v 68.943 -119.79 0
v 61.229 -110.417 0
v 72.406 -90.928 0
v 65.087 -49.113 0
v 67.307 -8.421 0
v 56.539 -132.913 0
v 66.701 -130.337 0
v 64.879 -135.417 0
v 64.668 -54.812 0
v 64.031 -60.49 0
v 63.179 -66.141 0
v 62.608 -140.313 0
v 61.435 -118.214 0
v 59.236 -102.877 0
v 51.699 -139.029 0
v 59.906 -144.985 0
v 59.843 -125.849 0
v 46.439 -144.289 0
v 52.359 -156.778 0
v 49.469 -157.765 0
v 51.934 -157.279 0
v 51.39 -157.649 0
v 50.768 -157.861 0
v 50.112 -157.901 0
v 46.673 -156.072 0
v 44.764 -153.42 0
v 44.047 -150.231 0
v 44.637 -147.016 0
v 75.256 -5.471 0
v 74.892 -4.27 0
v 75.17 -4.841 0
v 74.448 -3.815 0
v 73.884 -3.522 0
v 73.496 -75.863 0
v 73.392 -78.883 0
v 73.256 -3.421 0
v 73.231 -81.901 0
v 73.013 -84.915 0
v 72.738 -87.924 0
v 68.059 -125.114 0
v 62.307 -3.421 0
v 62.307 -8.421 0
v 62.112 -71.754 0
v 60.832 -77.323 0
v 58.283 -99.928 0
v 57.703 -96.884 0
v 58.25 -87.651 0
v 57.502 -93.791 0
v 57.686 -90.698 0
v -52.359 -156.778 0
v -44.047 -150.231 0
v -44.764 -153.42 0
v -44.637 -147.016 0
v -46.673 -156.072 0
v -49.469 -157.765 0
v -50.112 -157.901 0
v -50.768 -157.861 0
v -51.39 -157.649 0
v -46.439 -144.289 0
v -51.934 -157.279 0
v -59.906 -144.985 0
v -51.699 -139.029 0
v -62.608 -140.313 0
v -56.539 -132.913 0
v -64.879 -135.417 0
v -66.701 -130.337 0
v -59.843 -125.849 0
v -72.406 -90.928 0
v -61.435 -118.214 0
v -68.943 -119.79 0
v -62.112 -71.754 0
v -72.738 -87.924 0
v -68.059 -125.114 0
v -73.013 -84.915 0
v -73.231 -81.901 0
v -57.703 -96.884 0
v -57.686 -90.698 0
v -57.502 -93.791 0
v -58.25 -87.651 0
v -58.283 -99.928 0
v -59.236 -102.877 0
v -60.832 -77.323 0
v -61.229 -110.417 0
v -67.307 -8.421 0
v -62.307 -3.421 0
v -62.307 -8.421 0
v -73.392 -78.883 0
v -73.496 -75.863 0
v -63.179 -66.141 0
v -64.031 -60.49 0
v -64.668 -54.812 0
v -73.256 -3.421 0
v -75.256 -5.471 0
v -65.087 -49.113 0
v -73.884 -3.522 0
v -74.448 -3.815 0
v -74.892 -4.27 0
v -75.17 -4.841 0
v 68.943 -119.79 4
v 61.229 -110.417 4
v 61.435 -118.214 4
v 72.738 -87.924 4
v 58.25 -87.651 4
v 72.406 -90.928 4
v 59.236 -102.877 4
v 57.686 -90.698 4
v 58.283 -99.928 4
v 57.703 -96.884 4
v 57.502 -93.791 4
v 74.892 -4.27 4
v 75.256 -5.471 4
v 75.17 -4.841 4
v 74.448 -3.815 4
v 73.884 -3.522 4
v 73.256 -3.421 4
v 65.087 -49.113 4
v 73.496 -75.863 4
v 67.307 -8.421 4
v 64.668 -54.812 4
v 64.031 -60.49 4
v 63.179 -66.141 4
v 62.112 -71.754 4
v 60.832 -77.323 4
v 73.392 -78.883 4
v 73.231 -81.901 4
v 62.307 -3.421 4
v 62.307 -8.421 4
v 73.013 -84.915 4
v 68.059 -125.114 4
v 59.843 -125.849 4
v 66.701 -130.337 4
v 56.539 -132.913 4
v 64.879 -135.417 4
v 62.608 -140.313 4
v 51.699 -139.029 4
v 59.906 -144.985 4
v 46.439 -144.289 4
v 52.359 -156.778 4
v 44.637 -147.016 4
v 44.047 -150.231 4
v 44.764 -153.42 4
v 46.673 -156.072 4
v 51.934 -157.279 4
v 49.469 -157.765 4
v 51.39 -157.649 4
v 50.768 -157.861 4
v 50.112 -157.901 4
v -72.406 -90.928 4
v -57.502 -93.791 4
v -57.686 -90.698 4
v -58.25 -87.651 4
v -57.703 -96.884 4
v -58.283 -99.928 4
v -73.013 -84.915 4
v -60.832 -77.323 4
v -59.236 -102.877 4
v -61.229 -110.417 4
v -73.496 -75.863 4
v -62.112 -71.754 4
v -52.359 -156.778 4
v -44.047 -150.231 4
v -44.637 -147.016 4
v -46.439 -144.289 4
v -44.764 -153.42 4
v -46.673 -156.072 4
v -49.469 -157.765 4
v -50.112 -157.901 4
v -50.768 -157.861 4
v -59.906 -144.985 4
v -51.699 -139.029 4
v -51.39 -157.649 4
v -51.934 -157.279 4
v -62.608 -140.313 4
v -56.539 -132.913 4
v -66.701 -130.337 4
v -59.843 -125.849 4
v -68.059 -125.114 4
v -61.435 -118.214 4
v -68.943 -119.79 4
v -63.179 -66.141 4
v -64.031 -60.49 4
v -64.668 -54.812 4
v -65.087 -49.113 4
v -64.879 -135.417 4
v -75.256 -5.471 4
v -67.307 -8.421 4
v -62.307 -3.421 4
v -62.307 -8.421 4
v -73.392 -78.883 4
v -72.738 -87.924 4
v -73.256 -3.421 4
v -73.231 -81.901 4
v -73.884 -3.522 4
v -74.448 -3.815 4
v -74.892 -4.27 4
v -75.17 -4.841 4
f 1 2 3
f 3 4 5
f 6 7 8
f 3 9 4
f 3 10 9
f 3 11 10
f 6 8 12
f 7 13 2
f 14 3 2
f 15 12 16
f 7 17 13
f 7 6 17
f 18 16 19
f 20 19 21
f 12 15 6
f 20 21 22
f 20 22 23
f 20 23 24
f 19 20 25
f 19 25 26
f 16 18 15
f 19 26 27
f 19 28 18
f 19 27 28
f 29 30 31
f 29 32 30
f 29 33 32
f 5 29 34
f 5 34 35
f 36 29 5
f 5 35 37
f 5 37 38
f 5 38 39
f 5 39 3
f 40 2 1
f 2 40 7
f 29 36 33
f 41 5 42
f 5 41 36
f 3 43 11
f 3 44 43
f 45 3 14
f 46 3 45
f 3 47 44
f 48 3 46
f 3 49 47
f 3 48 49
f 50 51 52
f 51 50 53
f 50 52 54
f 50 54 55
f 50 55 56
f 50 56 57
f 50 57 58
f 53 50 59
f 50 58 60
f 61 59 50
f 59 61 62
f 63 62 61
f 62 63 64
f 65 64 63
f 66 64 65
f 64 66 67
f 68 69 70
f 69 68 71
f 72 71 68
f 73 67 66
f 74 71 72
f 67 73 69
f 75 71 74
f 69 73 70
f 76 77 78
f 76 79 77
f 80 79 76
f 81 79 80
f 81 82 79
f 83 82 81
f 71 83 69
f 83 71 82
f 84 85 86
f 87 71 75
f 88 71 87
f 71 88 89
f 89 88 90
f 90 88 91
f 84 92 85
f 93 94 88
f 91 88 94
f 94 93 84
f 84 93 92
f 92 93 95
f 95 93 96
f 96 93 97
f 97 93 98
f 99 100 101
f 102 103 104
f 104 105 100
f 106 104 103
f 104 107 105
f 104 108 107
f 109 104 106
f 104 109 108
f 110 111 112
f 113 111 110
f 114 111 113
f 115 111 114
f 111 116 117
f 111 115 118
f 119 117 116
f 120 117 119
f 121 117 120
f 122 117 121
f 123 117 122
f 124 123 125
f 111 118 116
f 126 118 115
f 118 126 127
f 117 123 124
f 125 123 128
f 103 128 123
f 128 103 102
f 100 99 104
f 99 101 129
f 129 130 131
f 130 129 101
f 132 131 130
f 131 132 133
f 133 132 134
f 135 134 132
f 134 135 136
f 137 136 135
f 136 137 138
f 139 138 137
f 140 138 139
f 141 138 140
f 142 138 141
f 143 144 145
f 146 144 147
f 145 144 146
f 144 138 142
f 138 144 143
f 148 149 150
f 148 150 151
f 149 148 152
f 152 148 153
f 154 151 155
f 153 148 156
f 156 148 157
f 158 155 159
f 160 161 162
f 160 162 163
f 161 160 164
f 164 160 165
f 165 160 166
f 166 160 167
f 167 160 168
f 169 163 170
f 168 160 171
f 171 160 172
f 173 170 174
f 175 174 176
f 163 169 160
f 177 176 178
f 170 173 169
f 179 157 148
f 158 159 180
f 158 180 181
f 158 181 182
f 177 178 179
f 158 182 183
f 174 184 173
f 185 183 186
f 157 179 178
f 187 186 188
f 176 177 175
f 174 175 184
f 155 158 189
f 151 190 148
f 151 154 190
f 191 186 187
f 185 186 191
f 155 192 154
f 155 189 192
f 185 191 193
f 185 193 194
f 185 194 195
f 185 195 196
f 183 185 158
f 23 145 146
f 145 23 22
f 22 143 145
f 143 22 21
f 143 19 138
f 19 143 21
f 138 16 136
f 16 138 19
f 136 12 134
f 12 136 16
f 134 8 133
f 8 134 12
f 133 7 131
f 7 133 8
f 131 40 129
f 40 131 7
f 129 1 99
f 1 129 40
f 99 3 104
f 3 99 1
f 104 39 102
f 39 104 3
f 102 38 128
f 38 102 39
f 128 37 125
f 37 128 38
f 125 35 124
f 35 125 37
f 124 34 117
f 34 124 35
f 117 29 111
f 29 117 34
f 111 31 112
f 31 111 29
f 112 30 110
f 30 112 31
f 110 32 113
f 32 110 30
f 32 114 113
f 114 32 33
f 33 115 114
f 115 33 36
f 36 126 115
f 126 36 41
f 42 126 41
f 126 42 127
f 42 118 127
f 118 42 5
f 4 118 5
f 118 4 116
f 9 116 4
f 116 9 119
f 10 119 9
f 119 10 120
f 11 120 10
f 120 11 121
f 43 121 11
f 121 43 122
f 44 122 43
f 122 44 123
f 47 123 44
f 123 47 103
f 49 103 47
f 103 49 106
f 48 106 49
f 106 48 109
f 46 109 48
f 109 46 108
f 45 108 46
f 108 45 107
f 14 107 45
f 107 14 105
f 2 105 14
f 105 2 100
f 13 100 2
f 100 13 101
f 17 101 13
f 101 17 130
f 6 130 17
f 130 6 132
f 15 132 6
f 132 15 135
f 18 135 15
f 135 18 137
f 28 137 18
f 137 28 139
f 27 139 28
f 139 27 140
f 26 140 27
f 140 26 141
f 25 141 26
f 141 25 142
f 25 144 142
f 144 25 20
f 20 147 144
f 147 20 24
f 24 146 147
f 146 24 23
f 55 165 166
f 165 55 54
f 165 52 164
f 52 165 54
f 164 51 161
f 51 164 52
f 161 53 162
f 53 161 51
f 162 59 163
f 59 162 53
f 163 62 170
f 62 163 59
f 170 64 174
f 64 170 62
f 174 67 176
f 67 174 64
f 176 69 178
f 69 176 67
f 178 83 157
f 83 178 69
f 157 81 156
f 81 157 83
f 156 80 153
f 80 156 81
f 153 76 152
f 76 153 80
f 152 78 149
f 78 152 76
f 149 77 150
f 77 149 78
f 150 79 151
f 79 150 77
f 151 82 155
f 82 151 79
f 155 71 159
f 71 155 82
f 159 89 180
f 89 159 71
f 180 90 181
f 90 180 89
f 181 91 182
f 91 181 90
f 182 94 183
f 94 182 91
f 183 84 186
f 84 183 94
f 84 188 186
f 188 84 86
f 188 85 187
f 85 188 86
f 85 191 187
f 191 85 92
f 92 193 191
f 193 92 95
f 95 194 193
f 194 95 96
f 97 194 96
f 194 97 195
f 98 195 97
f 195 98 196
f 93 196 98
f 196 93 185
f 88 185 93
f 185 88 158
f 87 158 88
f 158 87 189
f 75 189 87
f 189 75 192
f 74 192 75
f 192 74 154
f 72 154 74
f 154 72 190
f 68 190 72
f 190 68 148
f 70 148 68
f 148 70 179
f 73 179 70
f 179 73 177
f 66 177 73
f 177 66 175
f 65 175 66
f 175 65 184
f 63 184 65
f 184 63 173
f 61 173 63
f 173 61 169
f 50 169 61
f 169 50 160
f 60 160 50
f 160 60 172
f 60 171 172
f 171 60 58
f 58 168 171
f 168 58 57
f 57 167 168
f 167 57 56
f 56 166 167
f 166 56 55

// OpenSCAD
w=148;
hw=w/2;
bridge=20;
edge=rnd(1,5);
rounding=rnd(10,14);
bridgeedge=rnd(edge,10);

halfbridge=bridge/2;
v0=rnd(-0.5,1);
v1=rnd(-0.5,1);
v2=rnd(-0.5,1);
v3=rnd(-0.5,1);
vm=[v0,v1,v2,v3];
v=vm/norm(vm);
n0=  [[-halfbridge, 0, 0], [-halfbridge, 2.5, 0], [3, 2, 25], [18, 10, 150], [48, 11, 150], [58, 4, 5], [67, 4, 1], [67, -4, 1], [62, -3, 5], [58, -18, 25], [51, -40, 25], [33, -40, 25], [8, -40, 25], [-4, -7, 1], [0, -3, 1.6], [-halfbridge, -3, 0]];
n1=  [[-halfbridge, 0, 0], [-halfbridge, 11, 0], [0, 11, 5], [8, 12, 10], [53, 11, 10], [58, 4, 5], [67, 4, 1], [67, -4, 0], [61, -4, 1], [60, -10, 5], [56, -40, 10], [33, -40, 0], [8, -40, 10], [-4, -7, 1], [0, -3, 1.6], [-halfbridge, -3, 0]];
n2=  [[-halfbridge, 0, 0], [-halfbridge, 2.5, 0], [0, 2, 5], [10, 20, 50], [48, 20, 50], [58, 4, 5], [67, 4, 1], [67, -4, 1], [61, -3, 3], [60, -10, 5], [53, -35, 50], [33, -35, 50], [8, -35, 50], [-4, -7, 1], [0, -3, 1.6], [-halfbridge, -3, 0]];
n3= [[-halfbridge, 0, 0], [-halfbridge, 0, 0], [8, 2.5, 5], [18, 10, 26], [38, 10, 26], [48, 2.5, 1], [67, 2.5, 1], [67, -4, 1], [48, -4, 5], [46, -15, 26], [35, -24, 26], [18, -25, 26], [8, -15, 26], [6, -4, 1], [-4, -6, 25], [-halfbridge, -6, 0]];

n=n0*v[0]+n1*v[1]+n2*v[2]+n3*v[3];
 

temp=[
[-5,0,0],[0,0,0],[8,0,2],[6,-80,160],[0,-130,60],[-16,-155,3],
[-30,-150,10],[0,-120,35],[-11,-92,26],[-3,-60,150],[0,-5,0],[-5,-5,0],];
 
// Library: round-anything
// Version: 1.0
// Author: IrevDev
// Contributors: TLC123
// Copyright: 2017
// License: GPL 3
//
//translate ([-75,-40,-10])import("D:/Downloads/glasses_front (1).STL");
// translate ([40-80,-160-10,-10])rotate([0,0,90])
//import("D:/Downloads/glasses_side.STL");
//mirror()translate ([39-80,-160-8,0])rotate([0,0,90])
//import( "D:/Downloads/glasses_side.STL");
//difference(){
//         union(){
//linear_extrude(5) frame(n);
//mirror()linear_extrude(5) frame(n);
//
//    translate ([ n[7].x,n[7].y])linear_extrude(4) polygon(polyRound(temp));
// mirror() translate ([n[7].x,n[7].y])linear_extrude(4) polygon(polyRound(temp));
//}
//    * translate ([0,0,-0.01])     union(){ translate ([n[7].x,n[7].y]+[0,2.4,0])linear_extrude(2,scale=[0,1]) square([4,15],center=true);
// translate ([n[7].x,n[7].y]+[2.4,0,0])linear_extrude(2,scale=[1,0]) square([15,4],center=true);
//}}

echo( n0 );
echo(n1  );
echo(n2 );
echo(n3  );

  linear_extrude(5)
union(){
 difference(){
 frame();
 offset(r=0) offset(r=-bridgeedge)frame();
}
corners();
}
  linear_extrude(4)
 {translate ([halfbridge,0])  translate ([ n[7].x,n[7].y])  polygon(polyRound(temp));
 mirror()  translate ([halfbridge,0])translate ([n[7].x,n[7].y])  polygon(polyRound(temp));}

module frame(){

   union(){
 translate ([halfbridge,0])  framehalf(n);
mirror() translate ([halfbridge,0])  framehalf(n);


}
}  
module corners(){

   union(){
 translate ([halfbridge,0])  corner(n);
mirror() translate ([halfbridge,0])  corner(n);


}
}  
module framehalf(n)   {

p=polyRound(n);
difference()
{polygon(p);
r=rounding;
b=edge;
offset(r=r)union(){
offset(-(r+b))polygon(p);
translate([37,-10])circle(0.01);
}
}
 

}
module corner(n)   {

p=polyRound([[n[5].x,n[5].y,0],n[6],n[7],[n[8].x,n[8].y,0]]);
 polygon(p); 
 

}
 *color("red")translate([0,0,5])polyline(n);
function polyRound(radiipoints,fn=5,debug=0)=
		let(p=getpoints(radiipoints)) //make list of coordinates without radii
		let(Lp=len(p))
		//remove the middle point of any three colinear points
		let(newrp=[for(i=[0:len(p)-1]) if(isColinear(p[wrap(i-1,Lp)],p[wrap(i+0,Lp)],p[wrap(i+1,Lp)])==0)radiipoints[wrap(i+0,Lp)] ])
		let(temp=[for(i=[0:len(newrp)-1]) //for each point in the radii array
				let(the5points=[for(j=[-2:2])newrp[wrap(i+j,len(newrp))]])//collect 5 radii points
                let(temp2=round5points(the5points,fn,debug))
								debug>0?temp2:newrp[i][2]==0?[[newrp[i][0],newrp[i][1]]]: //return the original point if the radius is 0
                CentreN2PointsArc(temp2[0],temp2[1],temp2[2],0,fn) //return the arc if everything is normal
		])
		[for (a = temp) for (b = a) b];//flattern and return the array

function round5points(rp,fn,debug=0)=
		rp[2][2]==0&&debug==0?[[rp[2][0],rp[2][1]]]://return the middle point if the radius is 0
		rp[2][2]==0&&debug==1?0://if debug is enabled and the radius is 0 return 0
		let(p=getpoints(rp)) //get list of points
		let(r=[for(i=[1:3]) rp[i][2]])//get the centre 3 radii
    //start by determining what the radius should be at point 3
    //find angles at points 2 , 3 and 4
    let(a2=cosineRuleAngle(p[0],p[1],p[2]))
    let(a3=cosineRuleAngle(p[1],p[2],p[3]))
    let(a4=cosineRuleAngle(p[2],p[3],p[4]))
    //find the distance between points 2&3 and between points 3&4
    let(d23=pointDist(p[1],p[2]))
    let(d34=pointDist(p[2],p[3]))
    //find the radius factors
    let(F23=(d23*tan(a2/2)*tan(a3/2))/(r[0]*tan(a3/2)+r[1]*tan(a2/2)))
    let(F34=(d34*tan(a3/2)*tan(a4/2))/(r[1]*tan(a4/2)+r[2]*tan(a3/2)))
    let(newR=min(r[1],F23*r[1],F34*r[1]))//use the smallest radius
		//now that the radius has been determined, find tangent points and circle centre
		let(tangD=newR/tan(a3/2))//distance to the tangent point from p3
    let(circD=newR/sin(a3/2))//distance to the circle centre from p3
		//find the angle from the p3
		let(an23=getAngle(p[1],p[2]))//angle from point 3 to 2
		let(an34=getAngle(p[3],p[2]))//angle from point 3 to 4
		//find tangent points
		let(t23=[p[2][0]-cos(an23)*tangD,p[2][1]-sin(an23)*tangD])//tangent point between points 2&3
		let(t34=[p[2][0]-cos(an34)*tangD,p[2][1]-sin(an34)*tangD])//tangent point between points 3&4
		//find circle centre
		let(tmid=getMidpoint(t23,t34))//midpoint between the two tangent points
		let(anCen=getAngle(tmid,p[2]))//angle from point 3 to circle centre
		let(cen=[p[2][0]-cos(anCen)*circD,p[2][1]-sin(anCen)*circD])//circle center by offseting from point 3
    //determine the direction of rotation
		debug==0?//if debug in disabled return arc (default)
        [t23,t34,cen]
		:(newR-r[1]);

function polycarious(radiipoints,fn=5)=
		let(p=getpoints(radiipoints)) 
		let(newrp=[for(i=[0:len(p)-1]) 
		 		let(the3points=[for(j=[-1:1]) p[wrap(i+j,len(p))]])
				if(isColinear(the3points[0],the3points[1],the3points[2])==0) radiipoints[wrap(i+0,len(p))] 
	  ])
		let(temp=[for(i=[0:len(newrp)-1]) 
				let(the3points=[for(j=[-1:1]) newrp[wrap(i+j,len(newrp))]])//collect 3 points
				let(temp2=round3points(the3points,fn))
            newrp[i][2]==0?[[newrp[i][0],newrp[i][1]]]: //return the original point if the radius is 0
            CentreN2PointsArc(temp2[0],temp2[1],temp2[2],0,fn) //return the arc if everything is normal
				])
		[for (a = temp) for (b = a) b]; //flattern and return the array

function round3points(rp,fn)=
    rp[1][2]==0?[[rp[1][0],rp[1][1]]]://return the middle point if the radius is 0
		let(p=getpoints(rp)) //get list of points
		let(r=max(0,rp[1][2]))//get the centre 3 radii
    let(ang=cosineRuleAngle(p[0],p[1],p[2]))//angle between the lines
    //now that the radius has been determined, find tangent points and circle centre
		let(tangD=r/tan(ang/2))//distance to the tangent point from p2
    let(circD=r/sin(ang/2))//distance to the circle centre from p2
		//find the angles from the p2 with respect to the postitive x axis
		let(a12=getAngle(p[0],p[1]))//angle from point 2 to 1
		let(a23=getAngle(p[2],p[1]))//angle from point 2 to 3
		//find tangent points
		let(t12=[p[1][0]-cos(a12)*tangD,p[1][1]-sin(a12)*tangD])//tangent point between points 1&2
		let(t23=[p[1][0]-cos(a23)*tangD,p[1][1]-sin(a23)*tangD])//tangent point between points 2&3
    //find circle centre
		let(tmid=getMidpoint(t12,t23))//midpoint between the two tangent points
		let(angCen=getAngle(tmid,p[1]))//angle from point 2 to circle centre
		let(cen=[p[1][0]-cos(angCen)*circD,p[1][1]-sin(angCen)*circD])//circle center by offseting from point 2 
		[t12,t23,cen];
        //CentreN2PointsArc(t12,t23,cen,0,fn);
        
function CentreN2PointsArc(p1,p2,cen,mode=0,fn)=
    /* This function plots an arc from p1 to p2 with fn increments using the cen as the centre of the arc.
    the mode determines how the arc is plotted
    mode==0, shortest arc possible 
    mode==1, longest arc possible
    mode==2, plotted clockwise
    mode==3, plotted counter clockwise
    */
    //determine the direction of rotation
    let(e1=(cen[0]-p1[0])*(cen[1]+p1[1]))//edge 1
    let(e2=(p2[0]-cen[0])*(p2[1]+cen[1]))//edge 2
    let(e3=(p1[0]-p2[0])*(p1[1]+p2[1]))//edge 3
    let(CWorCCW=(e1+e2+e3)/abs(e1+e2+e3))//rotation of the three points cw or ccw?
    //determine the arc angle depending on the mode
    let(p1p2Angle=cosineRuleAngle(p2,cen,p1))
    let(arcAngle=
        mode==0?p1p2Angle:
        mode==1?p1p2Angle-360:
        mode==2&&CWorCCW==-1?p1p2Angle:
        mode==2&&CWorCCW== 1?p1p2Angle-360:
        mode==3&&CWorCCW== 1?p1p2Angle:
        mode==3&&CWorCCW==-1?p1p2Angle-360:
        cosineRuleAngle(p2,cen,p1))
    let(r=pointDist(p1,cen))//determine the radius
	let(p1Angle=getAngle(cen,p1))//angle of line 1
    [for(i=[0:fn]) [cos(p1Angle+(arcAngle/fn)*i*CWorCCW)*r+cen[0],sin(p1Angle+(arcAngle/fn)*i*CWorCCW)*r+cen[1]]];
 
function invtan(run,rise)=
    let(a=abs(atan(rise/run)))
    rise==0&&run>0?0:rise>0&&run>0?a:rise>0&&run==0?90:rise>0&&run<0?180-a:rise==0&&run<0?180:rise<0&&run<0?a+180:rise<0&&run==0?270:rise<0&&run>0?360-a:"error";

function cosineRuleAngle(p1,p2,p3)=
    let(p12=abs(pointDist(p1,p2)))
    let(p13=abs(pointDist(p1,p3)))
    let(p23=abs(pointDist(p2,p3)))
    acos((sq(p23)+sq(p12)-sq(p13))/(2*p23*p12));

function sq(x)=x*x;
function getGradient(p1,p2)=(p2[1]-p1[1])/(p2[0]-p1[0]);
function getAngle(p1,p2)=invtan(p2[0]-p1[0],p2[1]-p1[1]);
function getMidpoint(p1,p2)=[(p1[0]+p2[0])/2,(p1[1]+p2[1])/2]; //returns the midpoint of two points
function pointDist(p1,p2)=sqrt(abs(sq(p1[0]-p2[0])+sq(p1[1]-p2[1]))); //returns the distance between two points
function isColinear(p1,p2,p3)=getGradient(p1,p2)==getGradient(p2,p3)?1:0;//return 1 if 3 points are colinear

 module polyline(p) {for(i=[0:max(0,len(p)-1)])line(p[i],p[wrap(i+1,len(p) )]);
} // polyline plotter

module line(p1, p2 ,width=0.3) 
{ // single line plotter
    hull() {
        translate([p1.x,p1.y]) sphere(width);
        translate([p2.x,p2.y]) sphere(width);
    }
}

function getpoints(p)=[for(i=[0:len(p)-1])[p[i].x,p[i].y]];// gets [x,y]list of[x,y,r]list
function wrap(x,x_max=1,x_min=0) = (((x - x_min) % (x_max - x_min)) + (x_max - x_min)) % (x_max - x_min) + x_min; // wraps numbers inside boundaries
function rnd(a = 1, b = 0, s = []) = 
  s == [] ? 
   (rands(min(a, b), max(   a, b), 1)[0]) 
  : 
   (rands(min(a, b), max(a, b), 1, s)[0])
  ; // nice rands wrapper 
